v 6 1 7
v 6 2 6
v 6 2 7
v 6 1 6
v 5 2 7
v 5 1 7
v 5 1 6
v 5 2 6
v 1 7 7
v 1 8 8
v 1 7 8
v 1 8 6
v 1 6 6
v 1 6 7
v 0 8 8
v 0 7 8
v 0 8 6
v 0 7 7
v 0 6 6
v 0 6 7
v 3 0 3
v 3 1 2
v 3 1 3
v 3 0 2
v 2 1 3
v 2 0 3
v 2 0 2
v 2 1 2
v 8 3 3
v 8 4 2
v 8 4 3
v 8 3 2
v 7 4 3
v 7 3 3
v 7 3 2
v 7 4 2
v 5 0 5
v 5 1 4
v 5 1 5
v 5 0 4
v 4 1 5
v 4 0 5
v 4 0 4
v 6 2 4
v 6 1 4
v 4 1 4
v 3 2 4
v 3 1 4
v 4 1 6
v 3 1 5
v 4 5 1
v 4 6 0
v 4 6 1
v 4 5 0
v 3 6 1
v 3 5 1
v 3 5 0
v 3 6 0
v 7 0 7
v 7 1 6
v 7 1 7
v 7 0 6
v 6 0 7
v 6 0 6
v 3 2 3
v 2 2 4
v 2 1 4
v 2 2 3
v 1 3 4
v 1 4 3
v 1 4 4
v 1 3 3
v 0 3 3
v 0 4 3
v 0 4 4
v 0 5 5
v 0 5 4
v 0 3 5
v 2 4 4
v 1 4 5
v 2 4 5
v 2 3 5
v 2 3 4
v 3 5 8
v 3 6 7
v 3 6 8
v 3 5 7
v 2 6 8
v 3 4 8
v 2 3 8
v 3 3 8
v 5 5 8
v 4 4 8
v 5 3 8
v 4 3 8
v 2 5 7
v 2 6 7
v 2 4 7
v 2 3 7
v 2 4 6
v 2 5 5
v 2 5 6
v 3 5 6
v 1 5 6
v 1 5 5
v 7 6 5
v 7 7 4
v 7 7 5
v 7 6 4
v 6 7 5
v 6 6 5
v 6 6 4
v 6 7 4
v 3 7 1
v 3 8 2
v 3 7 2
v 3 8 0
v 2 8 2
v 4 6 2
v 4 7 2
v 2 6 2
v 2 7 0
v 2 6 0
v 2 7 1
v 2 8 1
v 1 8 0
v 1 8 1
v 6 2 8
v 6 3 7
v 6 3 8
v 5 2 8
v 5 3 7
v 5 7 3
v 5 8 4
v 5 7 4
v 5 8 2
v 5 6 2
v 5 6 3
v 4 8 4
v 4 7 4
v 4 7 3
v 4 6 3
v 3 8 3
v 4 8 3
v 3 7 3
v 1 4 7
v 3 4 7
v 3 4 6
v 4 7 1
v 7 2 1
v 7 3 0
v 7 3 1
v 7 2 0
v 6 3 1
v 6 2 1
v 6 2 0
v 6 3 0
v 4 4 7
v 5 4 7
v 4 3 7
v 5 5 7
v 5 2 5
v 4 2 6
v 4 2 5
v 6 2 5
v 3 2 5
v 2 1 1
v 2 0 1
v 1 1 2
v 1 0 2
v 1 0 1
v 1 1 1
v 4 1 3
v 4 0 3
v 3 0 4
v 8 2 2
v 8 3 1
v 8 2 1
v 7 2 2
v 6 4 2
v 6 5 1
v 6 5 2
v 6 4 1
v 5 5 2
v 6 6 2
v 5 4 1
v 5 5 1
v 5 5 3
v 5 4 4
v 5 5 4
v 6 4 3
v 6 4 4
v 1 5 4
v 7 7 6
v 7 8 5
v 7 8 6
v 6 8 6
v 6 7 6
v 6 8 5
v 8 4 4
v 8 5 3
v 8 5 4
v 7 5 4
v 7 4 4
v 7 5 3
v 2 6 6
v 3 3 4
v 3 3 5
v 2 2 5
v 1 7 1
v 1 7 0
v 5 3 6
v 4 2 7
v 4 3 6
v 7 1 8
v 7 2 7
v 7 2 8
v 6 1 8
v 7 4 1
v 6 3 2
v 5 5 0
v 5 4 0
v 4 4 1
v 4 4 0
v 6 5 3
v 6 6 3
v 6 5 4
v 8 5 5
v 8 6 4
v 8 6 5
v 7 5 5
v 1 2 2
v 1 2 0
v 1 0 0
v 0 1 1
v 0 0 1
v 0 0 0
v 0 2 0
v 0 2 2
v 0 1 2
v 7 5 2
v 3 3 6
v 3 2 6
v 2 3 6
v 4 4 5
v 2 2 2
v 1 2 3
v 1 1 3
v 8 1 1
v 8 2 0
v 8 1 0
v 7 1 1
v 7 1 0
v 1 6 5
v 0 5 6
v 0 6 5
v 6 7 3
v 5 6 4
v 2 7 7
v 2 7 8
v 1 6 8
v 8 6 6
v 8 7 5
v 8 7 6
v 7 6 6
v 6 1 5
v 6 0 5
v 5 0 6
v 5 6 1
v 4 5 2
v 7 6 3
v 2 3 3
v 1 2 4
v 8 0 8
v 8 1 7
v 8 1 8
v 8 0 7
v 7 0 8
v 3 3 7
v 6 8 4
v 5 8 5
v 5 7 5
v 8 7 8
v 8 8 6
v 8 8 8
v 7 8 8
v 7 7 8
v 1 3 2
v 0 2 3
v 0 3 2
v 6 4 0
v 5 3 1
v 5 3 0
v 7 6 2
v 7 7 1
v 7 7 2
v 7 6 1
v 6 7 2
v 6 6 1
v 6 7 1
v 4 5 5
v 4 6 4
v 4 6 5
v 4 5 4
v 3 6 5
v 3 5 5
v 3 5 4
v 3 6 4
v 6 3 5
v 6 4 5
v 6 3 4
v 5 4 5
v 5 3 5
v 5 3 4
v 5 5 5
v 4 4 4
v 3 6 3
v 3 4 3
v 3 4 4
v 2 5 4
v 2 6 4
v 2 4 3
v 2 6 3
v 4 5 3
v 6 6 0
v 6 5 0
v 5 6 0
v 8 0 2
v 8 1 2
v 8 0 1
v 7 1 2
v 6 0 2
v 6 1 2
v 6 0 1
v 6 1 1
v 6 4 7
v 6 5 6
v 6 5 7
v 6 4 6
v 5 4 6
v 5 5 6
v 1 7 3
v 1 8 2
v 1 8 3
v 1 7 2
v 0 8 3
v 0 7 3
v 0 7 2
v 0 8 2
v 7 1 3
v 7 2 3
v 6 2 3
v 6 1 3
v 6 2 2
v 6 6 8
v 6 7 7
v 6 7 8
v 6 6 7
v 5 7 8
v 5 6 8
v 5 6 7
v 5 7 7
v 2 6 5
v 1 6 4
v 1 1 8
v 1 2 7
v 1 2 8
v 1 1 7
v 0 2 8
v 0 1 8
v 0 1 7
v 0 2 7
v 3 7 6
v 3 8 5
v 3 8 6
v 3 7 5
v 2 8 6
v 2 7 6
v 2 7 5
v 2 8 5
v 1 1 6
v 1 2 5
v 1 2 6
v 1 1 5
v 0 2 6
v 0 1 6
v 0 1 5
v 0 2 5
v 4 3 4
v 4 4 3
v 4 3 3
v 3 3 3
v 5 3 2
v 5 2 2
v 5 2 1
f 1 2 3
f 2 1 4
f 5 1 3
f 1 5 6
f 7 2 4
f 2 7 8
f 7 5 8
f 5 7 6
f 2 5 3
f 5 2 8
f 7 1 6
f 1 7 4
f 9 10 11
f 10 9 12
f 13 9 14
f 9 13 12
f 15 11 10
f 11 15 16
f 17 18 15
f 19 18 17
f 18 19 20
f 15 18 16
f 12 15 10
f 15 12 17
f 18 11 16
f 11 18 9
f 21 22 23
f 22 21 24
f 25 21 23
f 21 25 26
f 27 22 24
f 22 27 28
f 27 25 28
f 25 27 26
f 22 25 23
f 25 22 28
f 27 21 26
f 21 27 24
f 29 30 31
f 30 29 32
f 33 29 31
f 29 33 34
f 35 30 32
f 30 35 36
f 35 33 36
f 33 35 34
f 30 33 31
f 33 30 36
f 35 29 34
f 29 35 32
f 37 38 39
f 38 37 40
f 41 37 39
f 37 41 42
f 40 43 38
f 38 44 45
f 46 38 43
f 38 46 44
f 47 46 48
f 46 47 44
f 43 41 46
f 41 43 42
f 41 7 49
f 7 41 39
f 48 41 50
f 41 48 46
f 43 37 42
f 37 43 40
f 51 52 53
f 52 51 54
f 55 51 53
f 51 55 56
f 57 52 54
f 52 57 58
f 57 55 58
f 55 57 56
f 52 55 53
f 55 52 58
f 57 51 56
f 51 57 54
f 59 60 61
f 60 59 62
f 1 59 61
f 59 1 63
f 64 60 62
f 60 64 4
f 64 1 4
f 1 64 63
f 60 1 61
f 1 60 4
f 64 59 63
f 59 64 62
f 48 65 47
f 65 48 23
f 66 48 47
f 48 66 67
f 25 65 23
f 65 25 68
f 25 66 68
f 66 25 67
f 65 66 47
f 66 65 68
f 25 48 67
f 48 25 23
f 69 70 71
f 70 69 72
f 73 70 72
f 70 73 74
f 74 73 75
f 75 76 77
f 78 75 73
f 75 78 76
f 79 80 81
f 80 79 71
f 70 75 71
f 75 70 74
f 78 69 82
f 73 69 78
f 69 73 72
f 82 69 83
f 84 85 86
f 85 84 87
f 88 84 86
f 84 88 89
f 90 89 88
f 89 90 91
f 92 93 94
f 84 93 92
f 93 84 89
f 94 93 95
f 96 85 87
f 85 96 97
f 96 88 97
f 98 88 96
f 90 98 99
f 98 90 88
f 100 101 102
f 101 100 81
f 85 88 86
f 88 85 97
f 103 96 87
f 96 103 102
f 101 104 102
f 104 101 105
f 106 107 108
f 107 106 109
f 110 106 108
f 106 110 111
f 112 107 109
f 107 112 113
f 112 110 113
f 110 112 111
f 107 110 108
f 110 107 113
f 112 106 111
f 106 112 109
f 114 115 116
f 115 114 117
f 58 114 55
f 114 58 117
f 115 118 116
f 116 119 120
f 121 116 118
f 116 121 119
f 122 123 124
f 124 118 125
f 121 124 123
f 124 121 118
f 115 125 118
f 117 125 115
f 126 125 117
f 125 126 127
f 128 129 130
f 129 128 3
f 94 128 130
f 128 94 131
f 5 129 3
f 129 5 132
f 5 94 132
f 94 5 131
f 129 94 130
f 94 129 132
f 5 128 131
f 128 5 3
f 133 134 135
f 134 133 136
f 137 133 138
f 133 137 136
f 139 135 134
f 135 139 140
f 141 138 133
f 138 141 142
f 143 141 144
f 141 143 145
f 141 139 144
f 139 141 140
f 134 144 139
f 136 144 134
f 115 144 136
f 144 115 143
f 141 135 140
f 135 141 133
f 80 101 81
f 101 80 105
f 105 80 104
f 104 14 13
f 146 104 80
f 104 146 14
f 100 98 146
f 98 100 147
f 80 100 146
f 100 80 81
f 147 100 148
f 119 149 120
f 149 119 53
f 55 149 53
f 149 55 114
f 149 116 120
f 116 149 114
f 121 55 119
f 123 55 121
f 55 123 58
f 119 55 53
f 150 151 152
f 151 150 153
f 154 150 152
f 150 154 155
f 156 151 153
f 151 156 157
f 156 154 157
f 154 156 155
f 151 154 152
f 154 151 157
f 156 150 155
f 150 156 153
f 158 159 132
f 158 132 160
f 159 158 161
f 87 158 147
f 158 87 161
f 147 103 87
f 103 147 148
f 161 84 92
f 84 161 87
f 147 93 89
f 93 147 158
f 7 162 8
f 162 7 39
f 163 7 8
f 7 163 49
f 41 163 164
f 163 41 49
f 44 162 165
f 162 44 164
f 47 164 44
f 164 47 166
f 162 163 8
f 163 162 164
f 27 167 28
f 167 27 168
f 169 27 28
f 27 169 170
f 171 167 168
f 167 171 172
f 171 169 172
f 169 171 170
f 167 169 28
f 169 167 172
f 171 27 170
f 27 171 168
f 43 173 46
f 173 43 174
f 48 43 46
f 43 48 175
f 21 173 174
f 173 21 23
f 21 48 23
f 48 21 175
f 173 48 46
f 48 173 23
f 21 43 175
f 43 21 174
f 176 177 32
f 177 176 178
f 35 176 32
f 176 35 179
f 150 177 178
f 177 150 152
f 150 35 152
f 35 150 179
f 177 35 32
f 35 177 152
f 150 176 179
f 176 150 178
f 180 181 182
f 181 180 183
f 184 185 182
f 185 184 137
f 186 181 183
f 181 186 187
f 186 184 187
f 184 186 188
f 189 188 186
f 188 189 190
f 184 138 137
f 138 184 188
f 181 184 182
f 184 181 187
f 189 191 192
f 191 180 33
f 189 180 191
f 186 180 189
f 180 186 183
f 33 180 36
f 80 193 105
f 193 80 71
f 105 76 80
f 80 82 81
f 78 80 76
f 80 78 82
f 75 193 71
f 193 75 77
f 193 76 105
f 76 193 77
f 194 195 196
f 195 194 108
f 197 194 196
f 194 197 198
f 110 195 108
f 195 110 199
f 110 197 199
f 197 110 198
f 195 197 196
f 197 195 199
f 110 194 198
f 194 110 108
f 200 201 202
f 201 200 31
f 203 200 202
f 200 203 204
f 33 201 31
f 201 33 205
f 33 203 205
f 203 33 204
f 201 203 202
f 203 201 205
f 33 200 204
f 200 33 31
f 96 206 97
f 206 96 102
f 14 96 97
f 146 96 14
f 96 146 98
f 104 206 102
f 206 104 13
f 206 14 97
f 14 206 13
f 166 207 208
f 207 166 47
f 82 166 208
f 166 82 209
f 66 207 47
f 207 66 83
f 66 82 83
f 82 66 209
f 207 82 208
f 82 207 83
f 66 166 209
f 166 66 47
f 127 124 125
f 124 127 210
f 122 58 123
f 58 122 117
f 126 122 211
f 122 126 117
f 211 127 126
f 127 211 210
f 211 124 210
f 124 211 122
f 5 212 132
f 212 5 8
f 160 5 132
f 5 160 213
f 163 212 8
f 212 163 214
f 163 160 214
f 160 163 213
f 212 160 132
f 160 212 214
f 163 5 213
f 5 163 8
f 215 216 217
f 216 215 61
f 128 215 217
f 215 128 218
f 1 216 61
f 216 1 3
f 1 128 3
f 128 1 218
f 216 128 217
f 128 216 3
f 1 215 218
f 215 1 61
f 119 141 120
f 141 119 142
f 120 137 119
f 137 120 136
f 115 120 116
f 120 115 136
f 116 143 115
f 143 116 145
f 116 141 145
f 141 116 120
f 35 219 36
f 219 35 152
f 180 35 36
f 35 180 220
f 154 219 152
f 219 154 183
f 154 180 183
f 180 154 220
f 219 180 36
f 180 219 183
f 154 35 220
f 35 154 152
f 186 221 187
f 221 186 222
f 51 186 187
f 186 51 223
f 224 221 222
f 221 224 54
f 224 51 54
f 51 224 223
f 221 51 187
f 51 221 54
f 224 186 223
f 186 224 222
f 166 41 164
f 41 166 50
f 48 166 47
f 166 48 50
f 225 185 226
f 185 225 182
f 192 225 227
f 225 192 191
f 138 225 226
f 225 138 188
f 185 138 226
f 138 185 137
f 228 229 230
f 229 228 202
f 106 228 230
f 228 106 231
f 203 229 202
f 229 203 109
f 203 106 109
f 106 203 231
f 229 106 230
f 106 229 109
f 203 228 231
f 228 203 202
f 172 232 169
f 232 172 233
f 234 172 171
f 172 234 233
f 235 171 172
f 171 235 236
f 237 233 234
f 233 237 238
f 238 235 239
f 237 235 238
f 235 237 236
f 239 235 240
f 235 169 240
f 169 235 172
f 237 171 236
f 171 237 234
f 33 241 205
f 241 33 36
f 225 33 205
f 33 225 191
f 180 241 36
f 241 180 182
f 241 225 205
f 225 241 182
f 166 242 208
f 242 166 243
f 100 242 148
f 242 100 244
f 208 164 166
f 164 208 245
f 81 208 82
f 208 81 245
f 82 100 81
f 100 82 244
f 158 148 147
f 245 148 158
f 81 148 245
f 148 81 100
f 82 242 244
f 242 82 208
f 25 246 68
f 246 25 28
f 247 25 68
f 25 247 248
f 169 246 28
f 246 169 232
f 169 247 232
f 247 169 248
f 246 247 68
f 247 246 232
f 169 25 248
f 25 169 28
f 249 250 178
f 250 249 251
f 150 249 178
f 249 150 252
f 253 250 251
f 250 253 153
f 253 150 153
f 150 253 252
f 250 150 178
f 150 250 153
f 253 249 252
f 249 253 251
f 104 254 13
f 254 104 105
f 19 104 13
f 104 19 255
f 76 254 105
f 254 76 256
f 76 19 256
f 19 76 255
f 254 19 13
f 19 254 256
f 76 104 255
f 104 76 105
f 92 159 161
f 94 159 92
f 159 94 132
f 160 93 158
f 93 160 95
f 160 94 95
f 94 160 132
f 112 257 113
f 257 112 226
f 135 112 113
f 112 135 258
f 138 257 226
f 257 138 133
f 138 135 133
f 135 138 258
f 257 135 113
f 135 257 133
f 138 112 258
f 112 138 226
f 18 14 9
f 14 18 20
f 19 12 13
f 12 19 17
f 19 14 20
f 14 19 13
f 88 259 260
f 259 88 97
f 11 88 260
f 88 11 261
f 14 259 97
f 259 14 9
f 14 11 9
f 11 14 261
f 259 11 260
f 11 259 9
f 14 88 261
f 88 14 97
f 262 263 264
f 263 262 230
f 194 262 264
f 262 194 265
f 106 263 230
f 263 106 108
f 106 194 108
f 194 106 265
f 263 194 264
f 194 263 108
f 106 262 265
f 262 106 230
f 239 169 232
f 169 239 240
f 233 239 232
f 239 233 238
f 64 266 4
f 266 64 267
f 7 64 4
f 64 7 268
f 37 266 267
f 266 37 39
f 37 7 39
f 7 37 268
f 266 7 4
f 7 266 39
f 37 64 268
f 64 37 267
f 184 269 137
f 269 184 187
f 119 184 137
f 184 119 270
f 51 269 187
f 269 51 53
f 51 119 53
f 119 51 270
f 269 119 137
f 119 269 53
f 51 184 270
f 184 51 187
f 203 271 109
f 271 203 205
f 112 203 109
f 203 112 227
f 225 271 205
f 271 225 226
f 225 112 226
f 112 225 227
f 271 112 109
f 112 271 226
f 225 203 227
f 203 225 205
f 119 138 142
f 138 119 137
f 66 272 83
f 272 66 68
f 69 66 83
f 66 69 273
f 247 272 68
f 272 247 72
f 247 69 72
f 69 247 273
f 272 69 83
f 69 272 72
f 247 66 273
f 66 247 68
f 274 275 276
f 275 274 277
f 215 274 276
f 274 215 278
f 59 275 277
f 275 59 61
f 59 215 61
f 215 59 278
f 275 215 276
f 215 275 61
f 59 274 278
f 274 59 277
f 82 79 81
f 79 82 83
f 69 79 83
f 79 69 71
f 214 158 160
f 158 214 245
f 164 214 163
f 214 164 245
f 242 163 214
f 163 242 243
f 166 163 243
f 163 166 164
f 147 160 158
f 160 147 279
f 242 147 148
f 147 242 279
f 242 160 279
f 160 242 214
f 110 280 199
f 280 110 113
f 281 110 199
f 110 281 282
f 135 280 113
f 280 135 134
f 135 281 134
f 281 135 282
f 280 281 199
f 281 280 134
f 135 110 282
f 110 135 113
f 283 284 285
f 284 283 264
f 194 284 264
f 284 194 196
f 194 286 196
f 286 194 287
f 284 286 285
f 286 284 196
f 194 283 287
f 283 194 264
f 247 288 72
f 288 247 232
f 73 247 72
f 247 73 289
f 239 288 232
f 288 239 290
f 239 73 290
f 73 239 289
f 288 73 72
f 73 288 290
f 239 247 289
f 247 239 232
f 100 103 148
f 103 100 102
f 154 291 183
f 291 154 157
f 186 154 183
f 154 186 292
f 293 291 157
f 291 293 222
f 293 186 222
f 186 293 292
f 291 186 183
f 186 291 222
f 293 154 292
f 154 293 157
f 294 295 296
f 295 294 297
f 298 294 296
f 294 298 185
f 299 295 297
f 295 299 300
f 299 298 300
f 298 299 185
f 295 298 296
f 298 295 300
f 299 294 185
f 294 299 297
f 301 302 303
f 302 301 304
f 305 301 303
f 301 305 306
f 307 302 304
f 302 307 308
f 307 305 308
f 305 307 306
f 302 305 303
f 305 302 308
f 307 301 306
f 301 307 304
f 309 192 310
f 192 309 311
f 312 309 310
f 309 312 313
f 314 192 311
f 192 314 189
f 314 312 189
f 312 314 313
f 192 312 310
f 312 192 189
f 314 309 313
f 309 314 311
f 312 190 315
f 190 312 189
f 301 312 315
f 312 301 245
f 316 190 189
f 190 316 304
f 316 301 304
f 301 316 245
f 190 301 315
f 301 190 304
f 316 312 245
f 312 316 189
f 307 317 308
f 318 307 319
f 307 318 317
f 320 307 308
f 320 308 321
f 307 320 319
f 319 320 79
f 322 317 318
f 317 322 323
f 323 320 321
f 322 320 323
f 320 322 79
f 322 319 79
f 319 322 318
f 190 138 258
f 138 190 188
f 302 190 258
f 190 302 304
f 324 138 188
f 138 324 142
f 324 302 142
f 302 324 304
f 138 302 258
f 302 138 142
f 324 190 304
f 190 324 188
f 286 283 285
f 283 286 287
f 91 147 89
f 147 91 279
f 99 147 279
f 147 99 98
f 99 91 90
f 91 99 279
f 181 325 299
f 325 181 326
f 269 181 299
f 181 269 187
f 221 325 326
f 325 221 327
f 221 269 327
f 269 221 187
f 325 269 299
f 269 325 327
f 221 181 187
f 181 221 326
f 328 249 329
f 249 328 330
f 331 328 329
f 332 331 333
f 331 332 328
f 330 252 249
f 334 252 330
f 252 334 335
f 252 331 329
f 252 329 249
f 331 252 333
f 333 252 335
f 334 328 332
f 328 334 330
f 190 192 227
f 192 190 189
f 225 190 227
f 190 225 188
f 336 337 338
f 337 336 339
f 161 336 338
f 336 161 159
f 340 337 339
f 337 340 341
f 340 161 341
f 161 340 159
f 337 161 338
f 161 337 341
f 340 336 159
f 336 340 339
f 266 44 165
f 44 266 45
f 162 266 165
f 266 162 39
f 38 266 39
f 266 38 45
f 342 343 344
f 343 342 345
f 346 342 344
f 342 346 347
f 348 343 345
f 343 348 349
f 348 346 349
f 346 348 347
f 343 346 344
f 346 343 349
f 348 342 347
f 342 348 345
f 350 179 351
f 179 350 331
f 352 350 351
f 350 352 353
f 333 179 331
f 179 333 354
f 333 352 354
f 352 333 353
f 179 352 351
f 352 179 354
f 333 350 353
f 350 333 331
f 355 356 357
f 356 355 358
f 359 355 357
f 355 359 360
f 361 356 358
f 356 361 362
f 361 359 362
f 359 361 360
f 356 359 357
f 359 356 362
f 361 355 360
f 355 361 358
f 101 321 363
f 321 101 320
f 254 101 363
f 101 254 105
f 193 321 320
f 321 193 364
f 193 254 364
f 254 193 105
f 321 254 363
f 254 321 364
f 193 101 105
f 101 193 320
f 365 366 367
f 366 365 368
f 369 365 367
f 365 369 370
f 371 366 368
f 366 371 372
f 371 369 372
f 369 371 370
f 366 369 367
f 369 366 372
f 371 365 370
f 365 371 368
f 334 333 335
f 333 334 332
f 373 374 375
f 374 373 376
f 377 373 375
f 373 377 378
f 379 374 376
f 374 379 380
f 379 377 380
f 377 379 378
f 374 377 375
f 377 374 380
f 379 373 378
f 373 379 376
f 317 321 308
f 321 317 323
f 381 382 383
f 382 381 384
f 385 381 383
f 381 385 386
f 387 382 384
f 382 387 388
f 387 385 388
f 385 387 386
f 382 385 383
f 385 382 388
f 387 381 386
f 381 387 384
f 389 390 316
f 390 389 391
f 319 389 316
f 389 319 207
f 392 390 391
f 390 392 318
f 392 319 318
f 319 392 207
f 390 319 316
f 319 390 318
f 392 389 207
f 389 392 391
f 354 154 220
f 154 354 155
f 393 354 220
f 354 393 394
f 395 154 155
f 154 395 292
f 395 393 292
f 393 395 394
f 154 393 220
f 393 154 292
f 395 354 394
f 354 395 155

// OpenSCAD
union() {
    translate([5.0, 1.0, 6.0]) cube([1, 1, 1]);
    translate([0.0, 7.0, 7.0]) cube([1, 1, 1]);
    translate([2.0, 0.0, 2.0]) cube([1, 1, 1]);
    translate([7.0, 3.0, 2.0]) cube([1, 1, 1]);
    translate([4.0, 0.0, 4.0]) cube([1, 1, 1]);
    translate([3.0, 5.0, 0.0]) cube([1, 1, 1]);
    translate([6.0, 0.0, 6.0]) cube([1, 1, 1]);
    translate([2.0, 1.0, 3.0]) cube([1, 1, 1]);
    translate([0.0, 3.0, 3.0]) cube([1, 1, 1]);
    translate([2.0, 5.0, 7.0]) cube([1, 1, 1]);
    translate([6.0, 6.0, 4.0]) cube([1, 1, 1]);
    translate([2.0, 7.0, 1.0]) cube([1, 1, 1]);
    translate([5.0, 2.0, 7.0]) cube([1, 1, 1]);
    translate([4.0, 7.0, 3.0]) cube([1, 1, 1]);
    translate([1.0, 4.0, 5.0]) cube([1, 1, 1]);
    translate([3.0, 6.0, 1.0]) cube([1, 1, 1]);
    translate([6.0, 2.0, 0.0]) cube([1, 1, 1]);
    translate([3.0, 4.0, 7.0]) cube([1, 1, 1]);
    translate([4.0, 1.0, 5.0]) cube([1, 1, 1]);
    translate([1.0, 0.0, 1.0]) cube([1, 1, 1]);
    translate([3.0, 0.0, 3.0]) cube([1, 1, 1]);
    translate([7.0, 2.0, 1.0]) cube([1, 1, 1]);
    translate([5.0, 4.0, 1.0]) cube([1, 1, 1]);
    translate([0.0, 4.0, 4.0]) cube([1, 1, 1]);
    translate([6.0, 7.0, 5.0]) cube([1, 1, 1]);
    translate([7.0, 4.0, 3.0]) cube([1, 1, 1]);
    translate([1.0, 5.0, 6.0]) cube([1, 1, 1]);
    translate([2.0, 2.0, 4.0]) cube([1, 1, 1]);
    translate([1.0, 7.0, 0.0]) cube([1, 1, 1]);
    translate([4.0, 2.0, 6.0]) cube([1, 1, 1]);
    translate([6.0, 1.0, 7.0]) cube([1, 1, 1]);
    translate([3.0, 7.0, 2.0]) cube([1, 1, 1]);
    translate([6.0, 3.0, 1.0]) cube([1, 1, 1]);
    translate([4.0, 4.0, 0.0]) cube([1, 1, 1]);
    translate([3.0, 1.0, 4.0]) cube([1, 1, 1]);
    translate([5.0, 5.0, 2.0]) cube([1, 1, 1]);
    translate([7.0, 5.0, 4.0]) cube([1, 1, 1]);
    translate([0.0, 0.0, 0.0]) cube([1, 1, 1]);
    translate([6.0, 4.0, 2.0]) cube([1, 1, 1]);
    translate([2.0, 3.0, 5.0]) cube([1, 1, 1]);
    translate([1.0, 1.0, 2.0]) cube([1, 1, 1]);
    translate([7.0, 1.0, 0.0]) cube([1, 1, 1]);
    translate([0.0, 5.0, 5.0]) cube([1, 1, 1]);
    translate([4.0, 3.0, 7.0]) cube([1, 1, 1]);
    translate([5.0, 6.0, 3.0]) cube([1, 1, 1]);
    translate([0.0, 6.0, 6.0]) cube([1, 1, 1]);
    translate([1.0, 6.0, 7.0]) cube([1, 1, 1]);
    translate([7.0, 6.0, 5.0]) cube([1, 1, 1]);
    translate([0.0, 1.0, 1.0]) cube([1, 1, 1]);
    translate([5.0, 0.0, 5.0]) cube([1, 1, 1]);
    translate([2.0, 6.0, 0.0]) cube([1, 1, 1]);
    translate([4.0, 5.0, 1.0]) cube([1, 1, 1]);
    translate([6.0, 5.0, 3.0]) cube([1, 1, 1]);
    translate([4.0, 6.0, 2.0]) cube([1, 1, 1]);
    translate([1.0, 2.0, 3.0]) cube([1, 1, 1]);
    translate([7.0, 0.0, 7.0]) cube([1, 1, 1]);
    translate([1.0, 3.0, 4.0]) cube([1, 1, 1]);
    translate([3.0, 2.0, 5.0]) cube([1, 1, 1]);
    translate([3.0, 3.0, 6.0]) cube([1, 1, 1]);
    translate([5.0, 7.0, 4.0]) cube([1, 1, 1]);
    translate([7.0, 7.0, 6.0]) cube([1, 1, 1]);
    translate([0.0, 2.0, 2.0]) cube([1, 1, 1]);
    translate([2.0, 4.0, 6.0]) cube([1, 1, 1]);
    translate([5.0, 3.0, 0.0]) cube([1, 1, 1]);
    translate([6.0, 6.0, 1.0]) cube([1, 1, 1]);
    translate([3.0, 5.0, 4.0]) cube([1, 1, 1]);
    translate([2.0, 6.0, 1.0]) cube([1, 1, 1]);
    translate([5.0, 3.0, 4.0]) cube([1, 1, 1]);
    translate([4.0, 4.0, 4.0]) cube([1, 1, 1]);
    translate([2.0, 4.0, 3.0]) cube([1, 1, 1]);
    translate([4.0, 5.0, 3.0]) cube([1, 1, 1]);
    translate([7.0, 7.0, 7.0]) cube([1, 1, 1]);
    translate([2.0, 3.0, 7.0]) cube([1, 1, 1]);
    translate([5.0, 5.0, 0.0]) cube([1, 1, 1]);
    translate([4.0, 4.0, 7.0]) cube([1, 1, 1]);
    translate([7.0, 0.0, 1.0]) cube([1, 1, 1]);
    translate([4.0, 1.0, 4.0]) cube([1, 1, 1]);
    translate([5.0, 4.0, 3.0]) cube([1, 1, 1]);
    translate([2.0, 4.0, 7.0]) cube([1, 1, 1]);
    translate([5.0, 4.0, 6.0]) cube([1, 1, 1]);
    translate([3.0, 3.0, 5.0]) cube([1, 1, 1]);
    translate([5.0, 1.0, 4.0]) cube([1, 1, 1]);
    translate([5.0, 4.0, 2.0]) cube([1, 1, 1]);
    translate([0.0, 1.0, 0.0]) cube([1, 1, 1]);
    translate([1.0, 4.0, 6.0]) cube([1, 1, 1]);
    translate([0.0, 7.0, 2.0]) cube([1, 1, 1]);
    translate([6.0, 1.0, 2.0]) cube([1, 1, 1]);
    translate([5.0, 6.0, 7.0]) cube([1, 1, 1]);
    translate([0.0, 7.0, 6.0]) cube([1, 1, 1]);
    translate([1.0, 5.0, 4.0]) cube([1, 1, 1]);
    translate([0.0, 1.0, 7.0]) cube([1, 1, 1]);
    translate([6.0, 0.0, 1.0]) cube([1, 1, 1]);
    translate([2.0, 7.0, 5.0]) cube([1, 1, 1]);
    translate([4.0, 7.0, 2.0]) cube([1, 1, 1]);
    translate([0.0, 3.0, 4.0]) cube([1, 1, 1]);
    translate([2.0, 5.0, 3.0]) cube([1, 1, 1]);
    translate([2.0, 7.0, 0.0]) cube([1, 1, 1]);
    translate([0.0, 1.0, 5.0]) cube([1, 1, 1]);
    translate([3.0, 3.0, 3.0]) cube([1, 1, 1]);
    translate([5.0, 2.0, 1.0]) cube([1, 1, 1]);
}
